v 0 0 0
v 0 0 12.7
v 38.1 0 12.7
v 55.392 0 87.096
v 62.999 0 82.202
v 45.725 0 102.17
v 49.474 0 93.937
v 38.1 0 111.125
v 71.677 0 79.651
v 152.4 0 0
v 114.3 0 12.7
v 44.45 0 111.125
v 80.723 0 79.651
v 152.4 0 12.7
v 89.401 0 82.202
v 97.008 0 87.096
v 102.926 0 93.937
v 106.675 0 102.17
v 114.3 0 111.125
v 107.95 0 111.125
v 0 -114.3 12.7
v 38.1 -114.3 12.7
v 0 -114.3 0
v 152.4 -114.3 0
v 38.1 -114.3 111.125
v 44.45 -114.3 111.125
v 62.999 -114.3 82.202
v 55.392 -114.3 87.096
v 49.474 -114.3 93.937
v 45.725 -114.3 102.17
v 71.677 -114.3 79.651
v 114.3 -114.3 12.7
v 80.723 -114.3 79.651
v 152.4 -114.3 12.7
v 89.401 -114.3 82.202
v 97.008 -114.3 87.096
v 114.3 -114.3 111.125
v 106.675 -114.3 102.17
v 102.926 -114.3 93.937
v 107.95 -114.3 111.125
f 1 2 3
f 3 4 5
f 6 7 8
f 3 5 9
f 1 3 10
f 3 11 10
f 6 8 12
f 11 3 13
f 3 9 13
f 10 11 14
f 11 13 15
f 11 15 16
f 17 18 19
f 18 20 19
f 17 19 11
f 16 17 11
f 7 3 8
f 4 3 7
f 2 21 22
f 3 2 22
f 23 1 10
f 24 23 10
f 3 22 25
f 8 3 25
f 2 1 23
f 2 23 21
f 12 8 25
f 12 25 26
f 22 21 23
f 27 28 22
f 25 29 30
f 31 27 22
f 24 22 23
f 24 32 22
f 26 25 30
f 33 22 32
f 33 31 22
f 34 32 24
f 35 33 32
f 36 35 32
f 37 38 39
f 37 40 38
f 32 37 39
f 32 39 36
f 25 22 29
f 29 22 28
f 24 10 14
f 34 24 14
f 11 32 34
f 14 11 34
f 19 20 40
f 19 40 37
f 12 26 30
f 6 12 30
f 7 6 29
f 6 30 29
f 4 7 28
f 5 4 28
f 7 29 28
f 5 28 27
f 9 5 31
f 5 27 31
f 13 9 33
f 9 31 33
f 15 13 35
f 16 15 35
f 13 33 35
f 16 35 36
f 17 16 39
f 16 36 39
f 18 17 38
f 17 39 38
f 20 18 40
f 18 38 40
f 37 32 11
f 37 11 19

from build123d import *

# Parameters (mm, degrees)
F0_W     = 152.4
F0_H     = 111.125
F1_DEPTH = 114.3
F2_W     = 38.1
F2_H     = 98.425
F3_DEPTH = 114.3
F5_DEPTH = 114.3


with BuildPart() as f1:
    # F0 (on Front) → F1 (new body)
    with BuildSketch(Plane.XZ):
        with Locations((76.2, 55.5625)):
            Rectangle(F0_W, F0_H)
    extrude(amount=F1_DEPTH)

    # F2 (on face) → F3 (cut)
    with BuildSketch(Plane.XZ.offset(114.3)):
        with Locations((19.05, 61.9125)):
            Rectangle(F2_W, F2_H)
        with Locations((133.35, 61.9125)):
            Rectangle(F2_W, F2_H)
    extrude(amount=-F3_DEPTH, mode=Mode.SUBTRACT)

    # F4 (on face) → F5 (cut)
    with BuildSketch(Plane.XZ.offset(114.3)):
        with BuildLine():
            Line((107.95, 111.125), (44.45, 111.125))
            ThreePointArc((44.45, 111.125), (76.2, 79.32702), (107.95, 111.125))
        make_face()
    extrude(amount=-F5_DEPTH, mode=Mode.SUBTRACT)


solid = f1.part
